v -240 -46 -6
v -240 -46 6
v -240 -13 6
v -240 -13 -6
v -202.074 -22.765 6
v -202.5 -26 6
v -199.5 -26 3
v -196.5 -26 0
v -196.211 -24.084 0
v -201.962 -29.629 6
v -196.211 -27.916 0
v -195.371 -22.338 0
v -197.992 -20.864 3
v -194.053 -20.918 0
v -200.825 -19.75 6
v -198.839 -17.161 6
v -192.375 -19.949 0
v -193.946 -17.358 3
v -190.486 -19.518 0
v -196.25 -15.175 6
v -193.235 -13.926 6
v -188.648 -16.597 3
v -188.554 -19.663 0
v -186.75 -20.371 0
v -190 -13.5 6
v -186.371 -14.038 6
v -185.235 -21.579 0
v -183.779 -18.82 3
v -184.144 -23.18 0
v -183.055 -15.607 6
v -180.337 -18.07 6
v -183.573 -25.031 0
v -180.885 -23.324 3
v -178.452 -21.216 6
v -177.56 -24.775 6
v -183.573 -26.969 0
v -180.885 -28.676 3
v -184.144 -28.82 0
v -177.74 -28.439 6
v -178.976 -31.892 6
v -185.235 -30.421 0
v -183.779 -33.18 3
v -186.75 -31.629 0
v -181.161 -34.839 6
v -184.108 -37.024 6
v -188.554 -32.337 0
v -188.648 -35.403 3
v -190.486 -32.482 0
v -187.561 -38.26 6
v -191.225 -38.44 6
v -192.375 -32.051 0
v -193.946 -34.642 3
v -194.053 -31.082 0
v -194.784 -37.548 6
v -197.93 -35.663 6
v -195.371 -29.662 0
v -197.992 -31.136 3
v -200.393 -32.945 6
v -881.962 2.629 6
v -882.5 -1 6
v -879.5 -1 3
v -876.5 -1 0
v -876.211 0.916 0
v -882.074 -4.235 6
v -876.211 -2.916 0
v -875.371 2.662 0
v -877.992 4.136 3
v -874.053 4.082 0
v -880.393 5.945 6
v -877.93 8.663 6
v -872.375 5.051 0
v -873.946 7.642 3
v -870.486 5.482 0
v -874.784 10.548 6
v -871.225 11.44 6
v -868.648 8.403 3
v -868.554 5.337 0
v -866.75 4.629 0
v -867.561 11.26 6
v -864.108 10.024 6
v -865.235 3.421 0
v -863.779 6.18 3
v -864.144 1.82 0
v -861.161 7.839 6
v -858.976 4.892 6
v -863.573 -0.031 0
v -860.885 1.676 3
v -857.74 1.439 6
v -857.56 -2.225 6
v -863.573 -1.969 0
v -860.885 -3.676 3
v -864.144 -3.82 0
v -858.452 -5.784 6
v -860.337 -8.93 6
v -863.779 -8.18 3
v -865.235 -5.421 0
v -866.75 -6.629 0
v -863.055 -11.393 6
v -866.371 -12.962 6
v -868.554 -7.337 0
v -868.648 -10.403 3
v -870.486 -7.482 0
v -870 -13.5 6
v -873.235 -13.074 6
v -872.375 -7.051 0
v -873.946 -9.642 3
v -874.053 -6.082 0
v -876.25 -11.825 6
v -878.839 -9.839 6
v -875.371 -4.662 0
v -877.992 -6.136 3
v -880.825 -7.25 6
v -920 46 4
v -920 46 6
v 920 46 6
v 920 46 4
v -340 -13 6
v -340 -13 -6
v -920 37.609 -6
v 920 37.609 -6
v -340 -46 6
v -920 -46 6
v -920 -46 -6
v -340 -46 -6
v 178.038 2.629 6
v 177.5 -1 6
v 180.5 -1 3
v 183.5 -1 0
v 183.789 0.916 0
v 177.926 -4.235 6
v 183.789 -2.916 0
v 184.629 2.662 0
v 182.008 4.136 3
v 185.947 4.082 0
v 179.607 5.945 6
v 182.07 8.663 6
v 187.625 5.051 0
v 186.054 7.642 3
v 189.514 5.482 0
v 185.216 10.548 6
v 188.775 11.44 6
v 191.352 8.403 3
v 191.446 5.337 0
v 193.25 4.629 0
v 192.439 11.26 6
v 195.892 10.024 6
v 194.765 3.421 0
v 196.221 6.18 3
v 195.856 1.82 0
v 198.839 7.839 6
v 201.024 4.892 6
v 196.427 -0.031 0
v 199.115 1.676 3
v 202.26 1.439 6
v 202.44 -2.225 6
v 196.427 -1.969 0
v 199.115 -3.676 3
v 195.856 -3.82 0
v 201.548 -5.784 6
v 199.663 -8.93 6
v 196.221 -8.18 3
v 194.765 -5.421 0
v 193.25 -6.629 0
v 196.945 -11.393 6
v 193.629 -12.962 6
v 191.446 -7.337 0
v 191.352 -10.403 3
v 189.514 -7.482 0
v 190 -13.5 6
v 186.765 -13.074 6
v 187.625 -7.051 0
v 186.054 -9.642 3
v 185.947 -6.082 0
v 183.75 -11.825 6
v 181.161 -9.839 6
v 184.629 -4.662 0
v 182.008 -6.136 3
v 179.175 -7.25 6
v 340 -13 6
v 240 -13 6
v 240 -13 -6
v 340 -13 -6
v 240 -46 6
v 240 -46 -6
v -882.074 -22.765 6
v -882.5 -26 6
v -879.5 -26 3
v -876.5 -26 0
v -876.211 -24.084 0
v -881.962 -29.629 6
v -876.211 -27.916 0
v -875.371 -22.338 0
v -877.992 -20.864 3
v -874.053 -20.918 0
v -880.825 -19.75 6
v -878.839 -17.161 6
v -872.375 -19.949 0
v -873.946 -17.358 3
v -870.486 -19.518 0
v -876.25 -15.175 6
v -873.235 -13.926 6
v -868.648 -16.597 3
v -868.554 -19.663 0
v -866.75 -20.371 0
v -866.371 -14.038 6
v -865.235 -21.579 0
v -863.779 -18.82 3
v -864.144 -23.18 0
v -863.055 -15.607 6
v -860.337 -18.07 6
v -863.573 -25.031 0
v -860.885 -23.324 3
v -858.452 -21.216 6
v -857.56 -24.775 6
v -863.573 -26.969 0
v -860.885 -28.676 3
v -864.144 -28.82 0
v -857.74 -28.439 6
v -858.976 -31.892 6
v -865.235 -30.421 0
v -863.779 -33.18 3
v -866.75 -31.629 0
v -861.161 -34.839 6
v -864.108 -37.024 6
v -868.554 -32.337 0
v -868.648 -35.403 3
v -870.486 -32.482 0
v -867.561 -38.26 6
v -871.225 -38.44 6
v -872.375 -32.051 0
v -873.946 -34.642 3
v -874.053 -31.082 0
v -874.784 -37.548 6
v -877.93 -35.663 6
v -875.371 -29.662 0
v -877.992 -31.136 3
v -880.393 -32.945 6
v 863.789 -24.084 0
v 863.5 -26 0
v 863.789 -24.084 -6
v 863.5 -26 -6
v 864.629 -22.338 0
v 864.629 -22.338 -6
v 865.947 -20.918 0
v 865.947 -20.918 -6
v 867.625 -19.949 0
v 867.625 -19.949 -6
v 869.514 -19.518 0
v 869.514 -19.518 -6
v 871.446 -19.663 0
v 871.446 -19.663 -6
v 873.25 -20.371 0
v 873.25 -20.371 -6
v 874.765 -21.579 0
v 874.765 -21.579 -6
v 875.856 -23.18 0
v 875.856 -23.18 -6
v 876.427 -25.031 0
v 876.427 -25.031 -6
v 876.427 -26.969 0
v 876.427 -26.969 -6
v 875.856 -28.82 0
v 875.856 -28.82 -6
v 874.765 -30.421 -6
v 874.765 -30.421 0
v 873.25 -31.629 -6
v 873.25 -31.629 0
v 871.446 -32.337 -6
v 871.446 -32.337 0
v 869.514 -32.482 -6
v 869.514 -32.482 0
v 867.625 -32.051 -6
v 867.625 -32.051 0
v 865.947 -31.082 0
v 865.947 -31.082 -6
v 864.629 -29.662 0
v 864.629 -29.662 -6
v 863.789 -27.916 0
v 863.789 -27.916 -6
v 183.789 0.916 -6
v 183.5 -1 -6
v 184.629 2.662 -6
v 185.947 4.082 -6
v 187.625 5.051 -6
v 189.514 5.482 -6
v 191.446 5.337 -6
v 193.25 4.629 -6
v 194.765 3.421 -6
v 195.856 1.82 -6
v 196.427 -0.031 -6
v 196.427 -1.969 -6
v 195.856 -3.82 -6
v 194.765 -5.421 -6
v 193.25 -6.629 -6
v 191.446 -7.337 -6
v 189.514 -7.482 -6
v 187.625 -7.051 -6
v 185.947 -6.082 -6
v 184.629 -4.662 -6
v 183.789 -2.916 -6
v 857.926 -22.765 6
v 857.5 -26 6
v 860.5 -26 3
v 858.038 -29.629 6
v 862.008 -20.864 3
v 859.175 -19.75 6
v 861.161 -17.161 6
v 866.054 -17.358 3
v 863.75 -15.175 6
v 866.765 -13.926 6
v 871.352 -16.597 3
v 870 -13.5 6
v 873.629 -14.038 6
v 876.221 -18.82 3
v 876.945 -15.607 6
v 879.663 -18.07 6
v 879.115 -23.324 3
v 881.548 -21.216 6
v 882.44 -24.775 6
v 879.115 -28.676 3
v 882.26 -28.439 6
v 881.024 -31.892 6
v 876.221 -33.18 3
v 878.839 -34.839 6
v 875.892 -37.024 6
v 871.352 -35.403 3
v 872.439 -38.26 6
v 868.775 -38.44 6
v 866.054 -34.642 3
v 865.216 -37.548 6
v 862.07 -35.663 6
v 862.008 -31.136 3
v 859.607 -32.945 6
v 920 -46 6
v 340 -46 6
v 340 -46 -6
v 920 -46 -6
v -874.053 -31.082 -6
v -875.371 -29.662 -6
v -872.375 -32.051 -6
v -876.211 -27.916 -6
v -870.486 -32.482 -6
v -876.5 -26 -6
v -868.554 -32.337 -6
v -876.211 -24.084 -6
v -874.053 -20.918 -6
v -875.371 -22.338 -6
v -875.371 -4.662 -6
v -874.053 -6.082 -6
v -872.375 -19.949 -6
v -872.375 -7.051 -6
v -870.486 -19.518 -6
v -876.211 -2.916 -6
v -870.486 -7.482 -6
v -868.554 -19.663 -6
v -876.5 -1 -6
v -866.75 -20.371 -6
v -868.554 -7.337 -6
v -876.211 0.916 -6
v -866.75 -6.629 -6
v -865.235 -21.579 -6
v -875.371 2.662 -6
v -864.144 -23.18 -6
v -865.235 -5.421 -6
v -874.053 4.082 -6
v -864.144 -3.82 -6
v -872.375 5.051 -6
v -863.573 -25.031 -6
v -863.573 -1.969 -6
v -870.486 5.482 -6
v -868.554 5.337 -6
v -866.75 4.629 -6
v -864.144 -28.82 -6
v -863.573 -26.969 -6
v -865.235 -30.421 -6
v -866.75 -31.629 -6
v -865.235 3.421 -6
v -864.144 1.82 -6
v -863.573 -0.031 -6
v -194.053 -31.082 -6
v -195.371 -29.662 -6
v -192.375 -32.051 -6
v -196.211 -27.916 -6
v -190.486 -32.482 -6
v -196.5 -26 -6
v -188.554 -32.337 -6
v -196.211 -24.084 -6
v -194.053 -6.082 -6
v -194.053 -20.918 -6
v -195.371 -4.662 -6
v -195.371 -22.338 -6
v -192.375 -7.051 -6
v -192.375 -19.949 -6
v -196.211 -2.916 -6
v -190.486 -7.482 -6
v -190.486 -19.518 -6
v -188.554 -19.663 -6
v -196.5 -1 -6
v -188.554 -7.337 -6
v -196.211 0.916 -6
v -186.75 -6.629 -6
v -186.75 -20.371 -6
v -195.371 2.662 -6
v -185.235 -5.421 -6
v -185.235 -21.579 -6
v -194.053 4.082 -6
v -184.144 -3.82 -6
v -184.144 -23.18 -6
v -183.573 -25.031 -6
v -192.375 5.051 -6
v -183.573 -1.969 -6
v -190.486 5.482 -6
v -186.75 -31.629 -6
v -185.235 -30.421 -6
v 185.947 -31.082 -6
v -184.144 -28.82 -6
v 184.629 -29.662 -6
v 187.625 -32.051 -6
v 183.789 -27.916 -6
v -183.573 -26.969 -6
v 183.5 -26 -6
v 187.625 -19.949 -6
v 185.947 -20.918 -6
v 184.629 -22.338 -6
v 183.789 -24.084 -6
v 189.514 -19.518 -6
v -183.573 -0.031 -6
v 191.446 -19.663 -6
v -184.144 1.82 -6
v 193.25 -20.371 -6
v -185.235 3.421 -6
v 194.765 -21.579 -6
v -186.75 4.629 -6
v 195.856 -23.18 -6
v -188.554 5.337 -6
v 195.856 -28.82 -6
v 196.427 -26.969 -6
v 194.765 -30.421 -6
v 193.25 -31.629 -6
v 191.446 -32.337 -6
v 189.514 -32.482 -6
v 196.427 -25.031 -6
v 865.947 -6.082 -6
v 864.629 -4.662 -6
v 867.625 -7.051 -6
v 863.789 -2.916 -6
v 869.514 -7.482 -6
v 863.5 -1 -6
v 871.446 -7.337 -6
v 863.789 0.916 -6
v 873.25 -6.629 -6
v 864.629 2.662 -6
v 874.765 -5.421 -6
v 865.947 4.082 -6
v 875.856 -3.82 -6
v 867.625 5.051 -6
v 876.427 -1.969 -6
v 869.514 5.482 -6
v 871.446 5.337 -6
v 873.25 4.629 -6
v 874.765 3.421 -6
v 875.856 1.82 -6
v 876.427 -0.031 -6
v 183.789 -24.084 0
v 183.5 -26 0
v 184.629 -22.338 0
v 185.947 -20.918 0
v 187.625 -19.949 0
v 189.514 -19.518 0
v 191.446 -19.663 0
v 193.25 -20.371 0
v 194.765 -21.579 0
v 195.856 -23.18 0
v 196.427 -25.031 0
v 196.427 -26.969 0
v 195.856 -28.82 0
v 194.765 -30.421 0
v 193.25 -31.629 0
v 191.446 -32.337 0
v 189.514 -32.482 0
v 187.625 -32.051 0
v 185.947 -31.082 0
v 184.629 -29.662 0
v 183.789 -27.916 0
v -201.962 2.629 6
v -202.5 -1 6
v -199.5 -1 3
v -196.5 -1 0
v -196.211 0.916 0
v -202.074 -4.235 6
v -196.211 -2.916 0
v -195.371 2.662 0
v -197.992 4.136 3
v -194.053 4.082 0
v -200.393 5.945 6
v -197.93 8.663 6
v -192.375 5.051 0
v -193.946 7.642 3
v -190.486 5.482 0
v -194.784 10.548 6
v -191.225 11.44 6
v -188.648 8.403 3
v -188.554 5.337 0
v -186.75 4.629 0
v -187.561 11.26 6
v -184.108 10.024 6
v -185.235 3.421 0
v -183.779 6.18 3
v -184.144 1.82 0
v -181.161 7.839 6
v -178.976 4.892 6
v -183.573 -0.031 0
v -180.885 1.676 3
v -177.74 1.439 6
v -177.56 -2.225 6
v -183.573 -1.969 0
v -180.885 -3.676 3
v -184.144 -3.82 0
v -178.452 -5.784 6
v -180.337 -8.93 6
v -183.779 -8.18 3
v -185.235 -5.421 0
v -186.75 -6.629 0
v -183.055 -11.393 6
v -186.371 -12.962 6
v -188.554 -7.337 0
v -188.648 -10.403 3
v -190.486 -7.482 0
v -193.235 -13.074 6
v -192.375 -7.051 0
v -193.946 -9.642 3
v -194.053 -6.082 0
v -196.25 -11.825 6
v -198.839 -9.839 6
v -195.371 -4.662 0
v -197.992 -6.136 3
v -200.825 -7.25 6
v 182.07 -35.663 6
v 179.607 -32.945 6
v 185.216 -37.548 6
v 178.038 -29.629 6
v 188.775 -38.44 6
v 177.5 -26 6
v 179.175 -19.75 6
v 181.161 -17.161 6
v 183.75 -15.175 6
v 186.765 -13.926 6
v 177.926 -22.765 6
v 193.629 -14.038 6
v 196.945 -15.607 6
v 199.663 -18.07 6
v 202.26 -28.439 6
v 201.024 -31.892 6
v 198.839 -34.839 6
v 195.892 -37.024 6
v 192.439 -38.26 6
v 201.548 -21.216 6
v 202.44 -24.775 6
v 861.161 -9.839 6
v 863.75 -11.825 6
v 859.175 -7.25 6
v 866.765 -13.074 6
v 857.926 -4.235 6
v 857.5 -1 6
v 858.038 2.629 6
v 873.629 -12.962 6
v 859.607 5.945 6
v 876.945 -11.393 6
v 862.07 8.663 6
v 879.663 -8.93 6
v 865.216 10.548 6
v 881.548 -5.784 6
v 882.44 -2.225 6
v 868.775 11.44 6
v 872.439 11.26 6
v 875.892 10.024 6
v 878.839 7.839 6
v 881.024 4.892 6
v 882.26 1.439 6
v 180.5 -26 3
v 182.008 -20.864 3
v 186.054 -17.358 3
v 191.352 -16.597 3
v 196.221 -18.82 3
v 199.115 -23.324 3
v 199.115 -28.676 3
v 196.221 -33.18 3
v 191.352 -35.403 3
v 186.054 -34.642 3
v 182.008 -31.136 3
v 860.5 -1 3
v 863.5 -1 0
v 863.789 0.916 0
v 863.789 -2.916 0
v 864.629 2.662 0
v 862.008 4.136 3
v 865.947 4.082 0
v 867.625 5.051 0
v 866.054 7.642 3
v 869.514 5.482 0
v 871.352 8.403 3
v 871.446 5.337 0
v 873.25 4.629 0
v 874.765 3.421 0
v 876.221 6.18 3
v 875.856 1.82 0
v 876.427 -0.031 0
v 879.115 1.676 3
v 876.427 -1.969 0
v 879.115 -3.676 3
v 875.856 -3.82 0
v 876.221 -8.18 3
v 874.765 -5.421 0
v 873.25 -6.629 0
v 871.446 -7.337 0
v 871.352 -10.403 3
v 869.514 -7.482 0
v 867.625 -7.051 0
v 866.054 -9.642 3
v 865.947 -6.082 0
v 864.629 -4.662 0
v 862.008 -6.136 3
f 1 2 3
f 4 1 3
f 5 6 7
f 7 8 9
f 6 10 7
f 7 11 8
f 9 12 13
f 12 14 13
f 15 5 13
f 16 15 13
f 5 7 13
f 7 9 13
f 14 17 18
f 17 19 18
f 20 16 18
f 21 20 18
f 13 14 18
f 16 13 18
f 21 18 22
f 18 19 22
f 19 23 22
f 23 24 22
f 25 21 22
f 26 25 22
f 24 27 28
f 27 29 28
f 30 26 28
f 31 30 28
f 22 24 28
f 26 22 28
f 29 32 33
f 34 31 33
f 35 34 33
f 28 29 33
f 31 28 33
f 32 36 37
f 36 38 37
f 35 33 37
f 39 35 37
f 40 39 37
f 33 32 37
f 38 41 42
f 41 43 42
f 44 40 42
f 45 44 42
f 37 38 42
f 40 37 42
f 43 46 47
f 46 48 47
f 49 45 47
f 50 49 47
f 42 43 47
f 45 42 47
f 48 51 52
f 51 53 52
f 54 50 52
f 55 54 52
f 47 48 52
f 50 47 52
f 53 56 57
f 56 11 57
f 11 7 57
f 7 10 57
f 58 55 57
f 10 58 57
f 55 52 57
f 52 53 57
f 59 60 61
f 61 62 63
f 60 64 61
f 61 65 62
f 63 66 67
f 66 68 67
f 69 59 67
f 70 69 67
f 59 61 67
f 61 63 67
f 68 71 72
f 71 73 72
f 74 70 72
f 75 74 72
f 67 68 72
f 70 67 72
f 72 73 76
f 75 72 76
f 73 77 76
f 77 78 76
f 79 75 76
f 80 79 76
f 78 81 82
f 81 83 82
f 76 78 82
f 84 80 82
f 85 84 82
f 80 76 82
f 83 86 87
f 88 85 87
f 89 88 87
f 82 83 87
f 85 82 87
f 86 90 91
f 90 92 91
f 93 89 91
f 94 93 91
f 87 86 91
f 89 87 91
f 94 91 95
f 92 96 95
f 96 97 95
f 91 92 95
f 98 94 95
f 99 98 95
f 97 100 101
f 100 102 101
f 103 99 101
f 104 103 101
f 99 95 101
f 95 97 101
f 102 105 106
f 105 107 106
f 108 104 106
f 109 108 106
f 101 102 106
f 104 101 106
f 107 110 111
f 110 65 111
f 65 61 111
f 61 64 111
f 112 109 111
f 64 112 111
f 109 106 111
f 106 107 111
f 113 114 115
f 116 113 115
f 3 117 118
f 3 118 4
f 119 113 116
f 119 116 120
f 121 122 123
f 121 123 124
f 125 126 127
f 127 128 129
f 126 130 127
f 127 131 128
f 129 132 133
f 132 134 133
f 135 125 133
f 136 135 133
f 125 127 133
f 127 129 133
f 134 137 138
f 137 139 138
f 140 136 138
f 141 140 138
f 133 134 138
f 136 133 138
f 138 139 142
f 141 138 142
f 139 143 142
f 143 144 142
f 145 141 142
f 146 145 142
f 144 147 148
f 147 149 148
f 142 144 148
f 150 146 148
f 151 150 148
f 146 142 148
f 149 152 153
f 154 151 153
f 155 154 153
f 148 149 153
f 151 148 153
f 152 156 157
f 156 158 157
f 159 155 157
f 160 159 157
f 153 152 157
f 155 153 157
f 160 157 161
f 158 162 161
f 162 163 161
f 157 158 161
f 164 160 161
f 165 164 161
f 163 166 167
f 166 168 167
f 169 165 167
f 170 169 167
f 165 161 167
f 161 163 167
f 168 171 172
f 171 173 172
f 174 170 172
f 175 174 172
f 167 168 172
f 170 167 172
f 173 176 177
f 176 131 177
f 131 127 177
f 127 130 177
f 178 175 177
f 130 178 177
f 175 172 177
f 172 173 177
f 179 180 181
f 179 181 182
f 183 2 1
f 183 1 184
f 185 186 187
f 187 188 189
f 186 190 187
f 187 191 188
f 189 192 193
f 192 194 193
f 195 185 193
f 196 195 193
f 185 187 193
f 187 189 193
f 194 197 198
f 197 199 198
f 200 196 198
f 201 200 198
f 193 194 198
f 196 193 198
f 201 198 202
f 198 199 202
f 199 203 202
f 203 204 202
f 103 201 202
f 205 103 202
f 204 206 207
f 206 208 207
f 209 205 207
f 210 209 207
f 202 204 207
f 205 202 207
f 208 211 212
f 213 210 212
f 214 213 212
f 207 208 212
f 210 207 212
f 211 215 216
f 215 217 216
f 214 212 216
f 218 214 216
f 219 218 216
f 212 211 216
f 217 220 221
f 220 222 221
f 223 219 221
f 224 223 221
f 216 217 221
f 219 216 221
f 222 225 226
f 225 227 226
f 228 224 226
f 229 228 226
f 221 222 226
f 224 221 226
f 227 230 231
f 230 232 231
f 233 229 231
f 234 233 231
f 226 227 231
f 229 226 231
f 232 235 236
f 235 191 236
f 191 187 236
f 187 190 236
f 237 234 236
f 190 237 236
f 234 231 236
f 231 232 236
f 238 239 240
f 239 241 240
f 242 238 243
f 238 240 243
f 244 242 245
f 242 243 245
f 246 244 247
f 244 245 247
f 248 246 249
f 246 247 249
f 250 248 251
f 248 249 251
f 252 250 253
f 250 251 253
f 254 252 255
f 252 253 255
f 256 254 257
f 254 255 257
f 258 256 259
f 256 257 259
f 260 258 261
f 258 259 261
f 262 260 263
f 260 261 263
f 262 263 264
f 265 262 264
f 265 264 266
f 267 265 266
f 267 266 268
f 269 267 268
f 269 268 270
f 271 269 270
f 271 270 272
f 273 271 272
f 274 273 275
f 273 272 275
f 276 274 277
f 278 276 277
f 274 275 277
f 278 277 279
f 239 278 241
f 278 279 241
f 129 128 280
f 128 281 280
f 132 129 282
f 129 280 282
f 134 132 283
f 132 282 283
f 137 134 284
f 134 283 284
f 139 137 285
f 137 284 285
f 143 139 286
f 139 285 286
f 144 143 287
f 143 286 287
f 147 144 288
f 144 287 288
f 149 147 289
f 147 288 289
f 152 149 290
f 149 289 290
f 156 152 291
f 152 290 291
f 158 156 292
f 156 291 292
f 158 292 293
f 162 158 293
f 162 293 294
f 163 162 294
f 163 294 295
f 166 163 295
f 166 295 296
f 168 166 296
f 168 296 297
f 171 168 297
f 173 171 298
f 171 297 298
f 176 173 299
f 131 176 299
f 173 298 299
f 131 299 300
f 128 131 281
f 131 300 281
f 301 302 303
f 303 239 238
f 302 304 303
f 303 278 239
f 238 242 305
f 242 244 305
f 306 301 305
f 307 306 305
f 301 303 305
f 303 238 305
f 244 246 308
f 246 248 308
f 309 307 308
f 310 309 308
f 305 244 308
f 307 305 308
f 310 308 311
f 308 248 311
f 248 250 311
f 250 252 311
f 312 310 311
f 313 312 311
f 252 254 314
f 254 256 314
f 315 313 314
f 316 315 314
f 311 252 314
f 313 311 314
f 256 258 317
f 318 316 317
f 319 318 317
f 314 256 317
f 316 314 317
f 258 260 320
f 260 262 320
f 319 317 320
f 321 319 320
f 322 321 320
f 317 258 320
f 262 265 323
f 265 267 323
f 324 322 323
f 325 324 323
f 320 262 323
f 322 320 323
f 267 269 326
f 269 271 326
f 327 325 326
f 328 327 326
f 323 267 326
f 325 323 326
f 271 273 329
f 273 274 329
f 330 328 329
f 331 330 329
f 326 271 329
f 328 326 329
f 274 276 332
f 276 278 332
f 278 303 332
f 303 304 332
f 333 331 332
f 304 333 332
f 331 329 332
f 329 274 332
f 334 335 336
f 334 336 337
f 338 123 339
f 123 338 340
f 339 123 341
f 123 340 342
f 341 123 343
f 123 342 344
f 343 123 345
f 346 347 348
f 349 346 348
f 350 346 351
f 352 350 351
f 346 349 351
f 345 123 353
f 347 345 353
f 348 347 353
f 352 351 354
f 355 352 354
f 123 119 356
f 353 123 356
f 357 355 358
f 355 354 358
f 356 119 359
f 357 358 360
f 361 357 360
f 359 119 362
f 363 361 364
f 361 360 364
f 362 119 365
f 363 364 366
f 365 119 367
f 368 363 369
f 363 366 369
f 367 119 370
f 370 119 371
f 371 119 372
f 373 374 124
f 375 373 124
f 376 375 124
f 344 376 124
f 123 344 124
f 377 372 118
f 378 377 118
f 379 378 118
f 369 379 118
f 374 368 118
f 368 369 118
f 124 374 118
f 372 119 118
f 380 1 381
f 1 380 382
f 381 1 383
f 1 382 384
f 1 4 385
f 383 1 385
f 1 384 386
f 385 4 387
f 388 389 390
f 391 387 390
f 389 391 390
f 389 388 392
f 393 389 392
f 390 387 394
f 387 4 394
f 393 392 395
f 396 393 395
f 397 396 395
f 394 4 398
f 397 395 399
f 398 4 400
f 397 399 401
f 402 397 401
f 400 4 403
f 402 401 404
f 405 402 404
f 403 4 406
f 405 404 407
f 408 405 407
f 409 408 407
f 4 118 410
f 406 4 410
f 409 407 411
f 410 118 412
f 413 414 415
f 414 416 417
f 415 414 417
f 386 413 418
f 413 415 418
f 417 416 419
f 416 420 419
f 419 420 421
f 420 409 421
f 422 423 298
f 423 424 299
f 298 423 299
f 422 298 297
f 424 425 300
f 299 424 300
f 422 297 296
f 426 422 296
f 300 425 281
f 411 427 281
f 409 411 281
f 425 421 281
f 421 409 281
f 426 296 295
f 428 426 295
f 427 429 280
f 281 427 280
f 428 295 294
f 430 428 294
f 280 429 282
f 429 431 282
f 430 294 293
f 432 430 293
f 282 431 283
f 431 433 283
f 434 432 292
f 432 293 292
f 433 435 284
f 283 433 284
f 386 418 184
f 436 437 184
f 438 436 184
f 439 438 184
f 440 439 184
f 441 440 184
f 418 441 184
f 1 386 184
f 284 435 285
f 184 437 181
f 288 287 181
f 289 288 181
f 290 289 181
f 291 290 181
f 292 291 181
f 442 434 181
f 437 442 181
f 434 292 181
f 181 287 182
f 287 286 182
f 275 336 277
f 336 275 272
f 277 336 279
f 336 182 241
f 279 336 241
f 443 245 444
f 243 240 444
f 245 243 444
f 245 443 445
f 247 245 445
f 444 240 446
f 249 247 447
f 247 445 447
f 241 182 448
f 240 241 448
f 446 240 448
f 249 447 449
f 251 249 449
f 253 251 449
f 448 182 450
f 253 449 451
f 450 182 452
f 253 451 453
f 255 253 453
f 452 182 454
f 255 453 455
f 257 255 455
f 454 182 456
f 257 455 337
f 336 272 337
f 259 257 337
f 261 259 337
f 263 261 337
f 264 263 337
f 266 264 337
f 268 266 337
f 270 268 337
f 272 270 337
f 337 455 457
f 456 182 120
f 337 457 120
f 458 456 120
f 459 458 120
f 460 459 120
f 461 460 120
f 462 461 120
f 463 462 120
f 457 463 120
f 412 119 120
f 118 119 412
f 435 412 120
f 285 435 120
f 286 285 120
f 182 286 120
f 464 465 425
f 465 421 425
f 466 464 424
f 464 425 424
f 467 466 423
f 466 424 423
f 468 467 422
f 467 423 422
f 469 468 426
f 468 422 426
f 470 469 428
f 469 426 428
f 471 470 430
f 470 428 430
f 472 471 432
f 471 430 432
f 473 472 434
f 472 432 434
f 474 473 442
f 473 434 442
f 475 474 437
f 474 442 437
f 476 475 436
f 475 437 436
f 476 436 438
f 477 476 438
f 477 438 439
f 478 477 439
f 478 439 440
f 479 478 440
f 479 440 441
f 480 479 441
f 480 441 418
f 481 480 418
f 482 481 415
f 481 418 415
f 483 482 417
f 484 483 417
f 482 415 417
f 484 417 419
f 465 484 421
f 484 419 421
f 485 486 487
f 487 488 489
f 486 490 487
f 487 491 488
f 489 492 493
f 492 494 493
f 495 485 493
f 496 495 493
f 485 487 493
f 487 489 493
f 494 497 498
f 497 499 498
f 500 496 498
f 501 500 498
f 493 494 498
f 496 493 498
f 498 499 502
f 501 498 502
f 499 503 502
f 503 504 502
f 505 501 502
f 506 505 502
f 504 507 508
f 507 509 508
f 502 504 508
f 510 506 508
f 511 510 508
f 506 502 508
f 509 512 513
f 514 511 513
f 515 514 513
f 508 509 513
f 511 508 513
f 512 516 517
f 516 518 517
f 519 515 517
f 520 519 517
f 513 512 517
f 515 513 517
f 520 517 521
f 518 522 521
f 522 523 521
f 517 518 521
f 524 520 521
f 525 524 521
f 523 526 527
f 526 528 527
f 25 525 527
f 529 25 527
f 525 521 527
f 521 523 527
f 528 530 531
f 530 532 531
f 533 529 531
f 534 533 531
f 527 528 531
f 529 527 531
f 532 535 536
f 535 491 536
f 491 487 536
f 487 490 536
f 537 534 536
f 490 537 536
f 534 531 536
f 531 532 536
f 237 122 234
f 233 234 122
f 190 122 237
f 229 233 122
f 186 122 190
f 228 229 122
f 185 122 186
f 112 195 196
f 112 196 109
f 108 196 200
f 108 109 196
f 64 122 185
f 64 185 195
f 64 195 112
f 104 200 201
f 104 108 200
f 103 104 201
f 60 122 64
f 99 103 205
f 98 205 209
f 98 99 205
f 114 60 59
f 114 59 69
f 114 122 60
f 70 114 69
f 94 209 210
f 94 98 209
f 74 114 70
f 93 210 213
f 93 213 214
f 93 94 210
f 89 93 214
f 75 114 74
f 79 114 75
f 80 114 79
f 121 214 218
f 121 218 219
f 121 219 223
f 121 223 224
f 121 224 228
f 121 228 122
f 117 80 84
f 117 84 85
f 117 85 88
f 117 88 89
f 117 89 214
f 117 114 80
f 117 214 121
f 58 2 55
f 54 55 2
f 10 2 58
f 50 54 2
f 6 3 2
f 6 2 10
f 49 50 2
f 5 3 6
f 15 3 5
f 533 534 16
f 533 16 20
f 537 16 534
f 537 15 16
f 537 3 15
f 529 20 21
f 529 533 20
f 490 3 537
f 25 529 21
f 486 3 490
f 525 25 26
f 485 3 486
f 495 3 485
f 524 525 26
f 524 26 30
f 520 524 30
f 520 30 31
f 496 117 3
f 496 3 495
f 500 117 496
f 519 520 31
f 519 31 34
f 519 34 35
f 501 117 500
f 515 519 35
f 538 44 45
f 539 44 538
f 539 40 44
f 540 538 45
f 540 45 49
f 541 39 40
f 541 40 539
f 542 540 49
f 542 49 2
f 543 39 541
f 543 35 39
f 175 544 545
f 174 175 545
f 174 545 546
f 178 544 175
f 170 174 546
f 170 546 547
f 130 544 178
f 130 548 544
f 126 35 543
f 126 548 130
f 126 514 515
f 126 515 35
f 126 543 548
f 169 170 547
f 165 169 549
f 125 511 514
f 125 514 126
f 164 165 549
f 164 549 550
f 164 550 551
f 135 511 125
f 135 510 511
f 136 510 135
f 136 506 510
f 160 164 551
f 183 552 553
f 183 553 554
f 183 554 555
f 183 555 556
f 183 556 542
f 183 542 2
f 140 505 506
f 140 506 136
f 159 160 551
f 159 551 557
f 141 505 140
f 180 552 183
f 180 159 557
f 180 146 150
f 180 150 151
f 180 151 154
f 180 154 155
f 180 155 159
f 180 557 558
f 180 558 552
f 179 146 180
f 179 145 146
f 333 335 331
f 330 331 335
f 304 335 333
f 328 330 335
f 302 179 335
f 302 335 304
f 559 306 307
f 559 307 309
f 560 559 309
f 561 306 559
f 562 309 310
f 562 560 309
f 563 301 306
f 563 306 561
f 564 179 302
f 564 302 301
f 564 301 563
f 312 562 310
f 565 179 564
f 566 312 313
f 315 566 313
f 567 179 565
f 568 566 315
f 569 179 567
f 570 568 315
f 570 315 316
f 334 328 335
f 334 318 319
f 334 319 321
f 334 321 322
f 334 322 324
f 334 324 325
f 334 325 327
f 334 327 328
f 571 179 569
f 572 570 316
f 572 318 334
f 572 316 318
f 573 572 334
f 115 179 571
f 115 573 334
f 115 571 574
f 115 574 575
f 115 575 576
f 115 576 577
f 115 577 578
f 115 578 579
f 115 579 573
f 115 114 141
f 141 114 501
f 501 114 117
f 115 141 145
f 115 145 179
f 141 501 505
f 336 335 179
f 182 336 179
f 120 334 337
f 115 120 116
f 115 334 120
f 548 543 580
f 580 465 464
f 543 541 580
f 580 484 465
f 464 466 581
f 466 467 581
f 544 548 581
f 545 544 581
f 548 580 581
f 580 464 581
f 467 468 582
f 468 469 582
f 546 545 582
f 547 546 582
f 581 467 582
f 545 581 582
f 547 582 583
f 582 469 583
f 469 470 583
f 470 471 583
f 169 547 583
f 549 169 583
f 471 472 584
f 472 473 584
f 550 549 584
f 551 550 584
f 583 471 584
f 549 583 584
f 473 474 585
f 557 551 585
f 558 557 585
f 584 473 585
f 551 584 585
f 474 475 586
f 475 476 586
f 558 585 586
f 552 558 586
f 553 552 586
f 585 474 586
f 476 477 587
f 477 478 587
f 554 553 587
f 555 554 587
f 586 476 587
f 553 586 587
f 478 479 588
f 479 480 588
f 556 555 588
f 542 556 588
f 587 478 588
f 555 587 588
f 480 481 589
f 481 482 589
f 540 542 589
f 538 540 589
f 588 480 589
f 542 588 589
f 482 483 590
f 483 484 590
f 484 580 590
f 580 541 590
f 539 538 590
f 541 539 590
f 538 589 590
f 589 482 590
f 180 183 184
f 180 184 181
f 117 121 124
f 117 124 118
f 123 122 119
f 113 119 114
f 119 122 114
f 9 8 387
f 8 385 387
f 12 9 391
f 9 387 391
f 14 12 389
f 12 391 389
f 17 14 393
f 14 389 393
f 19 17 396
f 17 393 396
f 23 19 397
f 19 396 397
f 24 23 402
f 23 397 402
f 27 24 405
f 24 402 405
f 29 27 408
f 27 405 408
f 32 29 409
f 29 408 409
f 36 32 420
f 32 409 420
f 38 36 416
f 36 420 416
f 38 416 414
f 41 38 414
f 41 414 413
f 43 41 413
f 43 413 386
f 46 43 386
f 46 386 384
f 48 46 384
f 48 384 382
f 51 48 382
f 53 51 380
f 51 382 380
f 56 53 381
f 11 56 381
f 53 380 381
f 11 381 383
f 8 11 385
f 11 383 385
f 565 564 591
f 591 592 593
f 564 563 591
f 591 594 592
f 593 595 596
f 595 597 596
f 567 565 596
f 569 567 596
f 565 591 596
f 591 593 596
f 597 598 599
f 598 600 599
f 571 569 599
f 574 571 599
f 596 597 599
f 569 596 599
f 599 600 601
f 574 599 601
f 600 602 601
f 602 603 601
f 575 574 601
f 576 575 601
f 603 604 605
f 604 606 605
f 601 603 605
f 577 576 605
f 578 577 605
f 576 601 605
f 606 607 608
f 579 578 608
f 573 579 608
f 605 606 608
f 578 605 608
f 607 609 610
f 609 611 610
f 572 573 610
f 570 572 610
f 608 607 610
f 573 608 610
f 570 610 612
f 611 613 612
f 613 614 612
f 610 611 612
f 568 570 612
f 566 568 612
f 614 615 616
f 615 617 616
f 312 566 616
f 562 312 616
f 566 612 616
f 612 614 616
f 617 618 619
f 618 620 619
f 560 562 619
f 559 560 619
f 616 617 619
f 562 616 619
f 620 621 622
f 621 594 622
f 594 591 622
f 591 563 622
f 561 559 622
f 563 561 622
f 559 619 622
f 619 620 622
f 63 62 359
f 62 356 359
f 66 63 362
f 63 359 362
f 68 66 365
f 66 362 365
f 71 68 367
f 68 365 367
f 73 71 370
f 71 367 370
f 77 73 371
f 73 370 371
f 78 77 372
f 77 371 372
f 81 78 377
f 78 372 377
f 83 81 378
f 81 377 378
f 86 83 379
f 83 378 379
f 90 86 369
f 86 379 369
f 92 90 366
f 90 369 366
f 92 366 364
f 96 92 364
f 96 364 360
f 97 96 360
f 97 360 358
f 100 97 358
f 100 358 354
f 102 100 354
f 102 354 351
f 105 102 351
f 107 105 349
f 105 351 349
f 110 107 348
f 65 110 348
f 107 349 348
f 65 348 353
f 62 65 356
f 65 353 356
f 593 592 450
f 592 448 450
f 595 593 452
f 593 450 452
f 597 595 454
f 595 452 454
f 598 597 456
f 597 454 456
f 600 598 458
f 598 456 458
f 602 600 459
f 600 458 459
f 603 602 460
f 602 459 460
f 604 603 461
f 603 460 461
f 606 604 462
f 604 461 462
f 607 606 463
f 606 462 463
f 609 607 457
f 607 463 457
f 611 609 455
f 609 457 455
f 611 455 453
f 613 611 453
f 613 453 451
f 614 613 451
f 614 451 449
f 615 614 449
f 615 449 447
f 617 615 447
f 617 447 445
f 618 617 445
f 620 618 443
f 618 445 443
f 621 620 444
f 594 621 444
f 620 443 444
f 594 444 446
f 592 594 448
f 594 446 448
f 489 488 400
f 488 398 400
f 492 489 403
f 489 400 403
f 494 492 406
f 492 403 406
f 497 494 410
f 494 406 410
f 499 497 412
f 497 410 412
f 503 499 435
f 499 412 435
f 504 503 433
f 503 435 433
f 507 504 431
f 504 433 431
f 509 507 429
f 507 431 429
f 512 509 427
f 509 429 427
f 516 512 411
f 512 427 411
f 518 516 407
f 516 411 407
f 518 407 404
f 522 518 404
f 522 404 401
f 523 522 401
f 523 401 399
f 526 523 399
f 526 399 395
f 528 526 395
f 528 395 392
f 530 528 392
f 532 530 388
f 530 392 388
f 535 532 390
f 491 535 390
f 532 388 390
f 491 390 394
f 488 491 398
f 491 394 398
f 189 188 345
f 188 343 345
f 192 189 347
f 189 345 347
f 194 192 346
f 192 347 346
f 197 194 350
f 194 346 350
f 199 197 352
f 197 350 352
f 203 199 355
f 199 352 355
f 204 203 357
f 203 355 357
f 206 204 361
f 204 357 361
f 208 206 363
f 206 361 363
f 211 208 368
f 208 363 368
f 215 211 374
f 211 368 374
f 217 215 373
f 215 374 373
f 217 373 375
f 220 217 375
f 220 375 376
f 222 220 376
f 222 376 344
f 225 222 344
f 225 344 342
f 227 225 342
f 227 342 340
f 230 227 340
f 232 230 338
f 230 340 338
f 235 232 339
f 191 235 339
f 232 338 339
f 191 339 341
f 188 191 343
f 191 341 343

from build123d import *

# Parameters (mm, degrees)
F0_W           = 1840
F0_H           = 92
F1_DEPTH       = 6
F2_W           = 100
F2_H           = 33
F3_DEPTH       = 12.001
F5_DEPTH       = 1840.001
F7_D           = 13
F7_CSINK_D     = 25
F7_CSINK_ANGLE = 90


with BuildPart() as f1:
    # F0 (on Top) → F1 (new body, symmetric)
    with BuildSketch(Plane.XY):
        Rectangle(F0_W, F0_H)
    extrude(amount=F1_DEPTH, both=True)

    # F2 (on face) → F3 (cut, through all)
    with BuildSketch(Plane.XY.offset(6)):
        with Locations((-290, -29.5)):
            Rectangle(F2_W, F2_H)
        with Locations((290, -29.5)):
            Rectangle(F2_W, F2_H)
    extrude(amount=-F3_DEPTH, mode=Mode.SUBTRACT)

    # F4 (on face) → F5 (cut, through all)
    with BuildSketch(Plane.YZ.offset(920)):
        Polygon((46, -6), (46, 4), (37.609004, -6), align=None)
    extrude(amount=-F5_DEPTH, mode=Mode.SUBTRACT)

    # F7 (through all)
    with Locations(Plane.XY.offset(6)):
        with Locations((-870, -1), (-870, -26), (-190, -1), (-190, -26), (190, -26), (190, -1), (870, -1), (870, -26)):
            CounterSinkHole(F7_D / 2, F7_CSINK_D / 2, counter_sink_angle=F7_CSINK_ANGLE)


solid = f1.part
